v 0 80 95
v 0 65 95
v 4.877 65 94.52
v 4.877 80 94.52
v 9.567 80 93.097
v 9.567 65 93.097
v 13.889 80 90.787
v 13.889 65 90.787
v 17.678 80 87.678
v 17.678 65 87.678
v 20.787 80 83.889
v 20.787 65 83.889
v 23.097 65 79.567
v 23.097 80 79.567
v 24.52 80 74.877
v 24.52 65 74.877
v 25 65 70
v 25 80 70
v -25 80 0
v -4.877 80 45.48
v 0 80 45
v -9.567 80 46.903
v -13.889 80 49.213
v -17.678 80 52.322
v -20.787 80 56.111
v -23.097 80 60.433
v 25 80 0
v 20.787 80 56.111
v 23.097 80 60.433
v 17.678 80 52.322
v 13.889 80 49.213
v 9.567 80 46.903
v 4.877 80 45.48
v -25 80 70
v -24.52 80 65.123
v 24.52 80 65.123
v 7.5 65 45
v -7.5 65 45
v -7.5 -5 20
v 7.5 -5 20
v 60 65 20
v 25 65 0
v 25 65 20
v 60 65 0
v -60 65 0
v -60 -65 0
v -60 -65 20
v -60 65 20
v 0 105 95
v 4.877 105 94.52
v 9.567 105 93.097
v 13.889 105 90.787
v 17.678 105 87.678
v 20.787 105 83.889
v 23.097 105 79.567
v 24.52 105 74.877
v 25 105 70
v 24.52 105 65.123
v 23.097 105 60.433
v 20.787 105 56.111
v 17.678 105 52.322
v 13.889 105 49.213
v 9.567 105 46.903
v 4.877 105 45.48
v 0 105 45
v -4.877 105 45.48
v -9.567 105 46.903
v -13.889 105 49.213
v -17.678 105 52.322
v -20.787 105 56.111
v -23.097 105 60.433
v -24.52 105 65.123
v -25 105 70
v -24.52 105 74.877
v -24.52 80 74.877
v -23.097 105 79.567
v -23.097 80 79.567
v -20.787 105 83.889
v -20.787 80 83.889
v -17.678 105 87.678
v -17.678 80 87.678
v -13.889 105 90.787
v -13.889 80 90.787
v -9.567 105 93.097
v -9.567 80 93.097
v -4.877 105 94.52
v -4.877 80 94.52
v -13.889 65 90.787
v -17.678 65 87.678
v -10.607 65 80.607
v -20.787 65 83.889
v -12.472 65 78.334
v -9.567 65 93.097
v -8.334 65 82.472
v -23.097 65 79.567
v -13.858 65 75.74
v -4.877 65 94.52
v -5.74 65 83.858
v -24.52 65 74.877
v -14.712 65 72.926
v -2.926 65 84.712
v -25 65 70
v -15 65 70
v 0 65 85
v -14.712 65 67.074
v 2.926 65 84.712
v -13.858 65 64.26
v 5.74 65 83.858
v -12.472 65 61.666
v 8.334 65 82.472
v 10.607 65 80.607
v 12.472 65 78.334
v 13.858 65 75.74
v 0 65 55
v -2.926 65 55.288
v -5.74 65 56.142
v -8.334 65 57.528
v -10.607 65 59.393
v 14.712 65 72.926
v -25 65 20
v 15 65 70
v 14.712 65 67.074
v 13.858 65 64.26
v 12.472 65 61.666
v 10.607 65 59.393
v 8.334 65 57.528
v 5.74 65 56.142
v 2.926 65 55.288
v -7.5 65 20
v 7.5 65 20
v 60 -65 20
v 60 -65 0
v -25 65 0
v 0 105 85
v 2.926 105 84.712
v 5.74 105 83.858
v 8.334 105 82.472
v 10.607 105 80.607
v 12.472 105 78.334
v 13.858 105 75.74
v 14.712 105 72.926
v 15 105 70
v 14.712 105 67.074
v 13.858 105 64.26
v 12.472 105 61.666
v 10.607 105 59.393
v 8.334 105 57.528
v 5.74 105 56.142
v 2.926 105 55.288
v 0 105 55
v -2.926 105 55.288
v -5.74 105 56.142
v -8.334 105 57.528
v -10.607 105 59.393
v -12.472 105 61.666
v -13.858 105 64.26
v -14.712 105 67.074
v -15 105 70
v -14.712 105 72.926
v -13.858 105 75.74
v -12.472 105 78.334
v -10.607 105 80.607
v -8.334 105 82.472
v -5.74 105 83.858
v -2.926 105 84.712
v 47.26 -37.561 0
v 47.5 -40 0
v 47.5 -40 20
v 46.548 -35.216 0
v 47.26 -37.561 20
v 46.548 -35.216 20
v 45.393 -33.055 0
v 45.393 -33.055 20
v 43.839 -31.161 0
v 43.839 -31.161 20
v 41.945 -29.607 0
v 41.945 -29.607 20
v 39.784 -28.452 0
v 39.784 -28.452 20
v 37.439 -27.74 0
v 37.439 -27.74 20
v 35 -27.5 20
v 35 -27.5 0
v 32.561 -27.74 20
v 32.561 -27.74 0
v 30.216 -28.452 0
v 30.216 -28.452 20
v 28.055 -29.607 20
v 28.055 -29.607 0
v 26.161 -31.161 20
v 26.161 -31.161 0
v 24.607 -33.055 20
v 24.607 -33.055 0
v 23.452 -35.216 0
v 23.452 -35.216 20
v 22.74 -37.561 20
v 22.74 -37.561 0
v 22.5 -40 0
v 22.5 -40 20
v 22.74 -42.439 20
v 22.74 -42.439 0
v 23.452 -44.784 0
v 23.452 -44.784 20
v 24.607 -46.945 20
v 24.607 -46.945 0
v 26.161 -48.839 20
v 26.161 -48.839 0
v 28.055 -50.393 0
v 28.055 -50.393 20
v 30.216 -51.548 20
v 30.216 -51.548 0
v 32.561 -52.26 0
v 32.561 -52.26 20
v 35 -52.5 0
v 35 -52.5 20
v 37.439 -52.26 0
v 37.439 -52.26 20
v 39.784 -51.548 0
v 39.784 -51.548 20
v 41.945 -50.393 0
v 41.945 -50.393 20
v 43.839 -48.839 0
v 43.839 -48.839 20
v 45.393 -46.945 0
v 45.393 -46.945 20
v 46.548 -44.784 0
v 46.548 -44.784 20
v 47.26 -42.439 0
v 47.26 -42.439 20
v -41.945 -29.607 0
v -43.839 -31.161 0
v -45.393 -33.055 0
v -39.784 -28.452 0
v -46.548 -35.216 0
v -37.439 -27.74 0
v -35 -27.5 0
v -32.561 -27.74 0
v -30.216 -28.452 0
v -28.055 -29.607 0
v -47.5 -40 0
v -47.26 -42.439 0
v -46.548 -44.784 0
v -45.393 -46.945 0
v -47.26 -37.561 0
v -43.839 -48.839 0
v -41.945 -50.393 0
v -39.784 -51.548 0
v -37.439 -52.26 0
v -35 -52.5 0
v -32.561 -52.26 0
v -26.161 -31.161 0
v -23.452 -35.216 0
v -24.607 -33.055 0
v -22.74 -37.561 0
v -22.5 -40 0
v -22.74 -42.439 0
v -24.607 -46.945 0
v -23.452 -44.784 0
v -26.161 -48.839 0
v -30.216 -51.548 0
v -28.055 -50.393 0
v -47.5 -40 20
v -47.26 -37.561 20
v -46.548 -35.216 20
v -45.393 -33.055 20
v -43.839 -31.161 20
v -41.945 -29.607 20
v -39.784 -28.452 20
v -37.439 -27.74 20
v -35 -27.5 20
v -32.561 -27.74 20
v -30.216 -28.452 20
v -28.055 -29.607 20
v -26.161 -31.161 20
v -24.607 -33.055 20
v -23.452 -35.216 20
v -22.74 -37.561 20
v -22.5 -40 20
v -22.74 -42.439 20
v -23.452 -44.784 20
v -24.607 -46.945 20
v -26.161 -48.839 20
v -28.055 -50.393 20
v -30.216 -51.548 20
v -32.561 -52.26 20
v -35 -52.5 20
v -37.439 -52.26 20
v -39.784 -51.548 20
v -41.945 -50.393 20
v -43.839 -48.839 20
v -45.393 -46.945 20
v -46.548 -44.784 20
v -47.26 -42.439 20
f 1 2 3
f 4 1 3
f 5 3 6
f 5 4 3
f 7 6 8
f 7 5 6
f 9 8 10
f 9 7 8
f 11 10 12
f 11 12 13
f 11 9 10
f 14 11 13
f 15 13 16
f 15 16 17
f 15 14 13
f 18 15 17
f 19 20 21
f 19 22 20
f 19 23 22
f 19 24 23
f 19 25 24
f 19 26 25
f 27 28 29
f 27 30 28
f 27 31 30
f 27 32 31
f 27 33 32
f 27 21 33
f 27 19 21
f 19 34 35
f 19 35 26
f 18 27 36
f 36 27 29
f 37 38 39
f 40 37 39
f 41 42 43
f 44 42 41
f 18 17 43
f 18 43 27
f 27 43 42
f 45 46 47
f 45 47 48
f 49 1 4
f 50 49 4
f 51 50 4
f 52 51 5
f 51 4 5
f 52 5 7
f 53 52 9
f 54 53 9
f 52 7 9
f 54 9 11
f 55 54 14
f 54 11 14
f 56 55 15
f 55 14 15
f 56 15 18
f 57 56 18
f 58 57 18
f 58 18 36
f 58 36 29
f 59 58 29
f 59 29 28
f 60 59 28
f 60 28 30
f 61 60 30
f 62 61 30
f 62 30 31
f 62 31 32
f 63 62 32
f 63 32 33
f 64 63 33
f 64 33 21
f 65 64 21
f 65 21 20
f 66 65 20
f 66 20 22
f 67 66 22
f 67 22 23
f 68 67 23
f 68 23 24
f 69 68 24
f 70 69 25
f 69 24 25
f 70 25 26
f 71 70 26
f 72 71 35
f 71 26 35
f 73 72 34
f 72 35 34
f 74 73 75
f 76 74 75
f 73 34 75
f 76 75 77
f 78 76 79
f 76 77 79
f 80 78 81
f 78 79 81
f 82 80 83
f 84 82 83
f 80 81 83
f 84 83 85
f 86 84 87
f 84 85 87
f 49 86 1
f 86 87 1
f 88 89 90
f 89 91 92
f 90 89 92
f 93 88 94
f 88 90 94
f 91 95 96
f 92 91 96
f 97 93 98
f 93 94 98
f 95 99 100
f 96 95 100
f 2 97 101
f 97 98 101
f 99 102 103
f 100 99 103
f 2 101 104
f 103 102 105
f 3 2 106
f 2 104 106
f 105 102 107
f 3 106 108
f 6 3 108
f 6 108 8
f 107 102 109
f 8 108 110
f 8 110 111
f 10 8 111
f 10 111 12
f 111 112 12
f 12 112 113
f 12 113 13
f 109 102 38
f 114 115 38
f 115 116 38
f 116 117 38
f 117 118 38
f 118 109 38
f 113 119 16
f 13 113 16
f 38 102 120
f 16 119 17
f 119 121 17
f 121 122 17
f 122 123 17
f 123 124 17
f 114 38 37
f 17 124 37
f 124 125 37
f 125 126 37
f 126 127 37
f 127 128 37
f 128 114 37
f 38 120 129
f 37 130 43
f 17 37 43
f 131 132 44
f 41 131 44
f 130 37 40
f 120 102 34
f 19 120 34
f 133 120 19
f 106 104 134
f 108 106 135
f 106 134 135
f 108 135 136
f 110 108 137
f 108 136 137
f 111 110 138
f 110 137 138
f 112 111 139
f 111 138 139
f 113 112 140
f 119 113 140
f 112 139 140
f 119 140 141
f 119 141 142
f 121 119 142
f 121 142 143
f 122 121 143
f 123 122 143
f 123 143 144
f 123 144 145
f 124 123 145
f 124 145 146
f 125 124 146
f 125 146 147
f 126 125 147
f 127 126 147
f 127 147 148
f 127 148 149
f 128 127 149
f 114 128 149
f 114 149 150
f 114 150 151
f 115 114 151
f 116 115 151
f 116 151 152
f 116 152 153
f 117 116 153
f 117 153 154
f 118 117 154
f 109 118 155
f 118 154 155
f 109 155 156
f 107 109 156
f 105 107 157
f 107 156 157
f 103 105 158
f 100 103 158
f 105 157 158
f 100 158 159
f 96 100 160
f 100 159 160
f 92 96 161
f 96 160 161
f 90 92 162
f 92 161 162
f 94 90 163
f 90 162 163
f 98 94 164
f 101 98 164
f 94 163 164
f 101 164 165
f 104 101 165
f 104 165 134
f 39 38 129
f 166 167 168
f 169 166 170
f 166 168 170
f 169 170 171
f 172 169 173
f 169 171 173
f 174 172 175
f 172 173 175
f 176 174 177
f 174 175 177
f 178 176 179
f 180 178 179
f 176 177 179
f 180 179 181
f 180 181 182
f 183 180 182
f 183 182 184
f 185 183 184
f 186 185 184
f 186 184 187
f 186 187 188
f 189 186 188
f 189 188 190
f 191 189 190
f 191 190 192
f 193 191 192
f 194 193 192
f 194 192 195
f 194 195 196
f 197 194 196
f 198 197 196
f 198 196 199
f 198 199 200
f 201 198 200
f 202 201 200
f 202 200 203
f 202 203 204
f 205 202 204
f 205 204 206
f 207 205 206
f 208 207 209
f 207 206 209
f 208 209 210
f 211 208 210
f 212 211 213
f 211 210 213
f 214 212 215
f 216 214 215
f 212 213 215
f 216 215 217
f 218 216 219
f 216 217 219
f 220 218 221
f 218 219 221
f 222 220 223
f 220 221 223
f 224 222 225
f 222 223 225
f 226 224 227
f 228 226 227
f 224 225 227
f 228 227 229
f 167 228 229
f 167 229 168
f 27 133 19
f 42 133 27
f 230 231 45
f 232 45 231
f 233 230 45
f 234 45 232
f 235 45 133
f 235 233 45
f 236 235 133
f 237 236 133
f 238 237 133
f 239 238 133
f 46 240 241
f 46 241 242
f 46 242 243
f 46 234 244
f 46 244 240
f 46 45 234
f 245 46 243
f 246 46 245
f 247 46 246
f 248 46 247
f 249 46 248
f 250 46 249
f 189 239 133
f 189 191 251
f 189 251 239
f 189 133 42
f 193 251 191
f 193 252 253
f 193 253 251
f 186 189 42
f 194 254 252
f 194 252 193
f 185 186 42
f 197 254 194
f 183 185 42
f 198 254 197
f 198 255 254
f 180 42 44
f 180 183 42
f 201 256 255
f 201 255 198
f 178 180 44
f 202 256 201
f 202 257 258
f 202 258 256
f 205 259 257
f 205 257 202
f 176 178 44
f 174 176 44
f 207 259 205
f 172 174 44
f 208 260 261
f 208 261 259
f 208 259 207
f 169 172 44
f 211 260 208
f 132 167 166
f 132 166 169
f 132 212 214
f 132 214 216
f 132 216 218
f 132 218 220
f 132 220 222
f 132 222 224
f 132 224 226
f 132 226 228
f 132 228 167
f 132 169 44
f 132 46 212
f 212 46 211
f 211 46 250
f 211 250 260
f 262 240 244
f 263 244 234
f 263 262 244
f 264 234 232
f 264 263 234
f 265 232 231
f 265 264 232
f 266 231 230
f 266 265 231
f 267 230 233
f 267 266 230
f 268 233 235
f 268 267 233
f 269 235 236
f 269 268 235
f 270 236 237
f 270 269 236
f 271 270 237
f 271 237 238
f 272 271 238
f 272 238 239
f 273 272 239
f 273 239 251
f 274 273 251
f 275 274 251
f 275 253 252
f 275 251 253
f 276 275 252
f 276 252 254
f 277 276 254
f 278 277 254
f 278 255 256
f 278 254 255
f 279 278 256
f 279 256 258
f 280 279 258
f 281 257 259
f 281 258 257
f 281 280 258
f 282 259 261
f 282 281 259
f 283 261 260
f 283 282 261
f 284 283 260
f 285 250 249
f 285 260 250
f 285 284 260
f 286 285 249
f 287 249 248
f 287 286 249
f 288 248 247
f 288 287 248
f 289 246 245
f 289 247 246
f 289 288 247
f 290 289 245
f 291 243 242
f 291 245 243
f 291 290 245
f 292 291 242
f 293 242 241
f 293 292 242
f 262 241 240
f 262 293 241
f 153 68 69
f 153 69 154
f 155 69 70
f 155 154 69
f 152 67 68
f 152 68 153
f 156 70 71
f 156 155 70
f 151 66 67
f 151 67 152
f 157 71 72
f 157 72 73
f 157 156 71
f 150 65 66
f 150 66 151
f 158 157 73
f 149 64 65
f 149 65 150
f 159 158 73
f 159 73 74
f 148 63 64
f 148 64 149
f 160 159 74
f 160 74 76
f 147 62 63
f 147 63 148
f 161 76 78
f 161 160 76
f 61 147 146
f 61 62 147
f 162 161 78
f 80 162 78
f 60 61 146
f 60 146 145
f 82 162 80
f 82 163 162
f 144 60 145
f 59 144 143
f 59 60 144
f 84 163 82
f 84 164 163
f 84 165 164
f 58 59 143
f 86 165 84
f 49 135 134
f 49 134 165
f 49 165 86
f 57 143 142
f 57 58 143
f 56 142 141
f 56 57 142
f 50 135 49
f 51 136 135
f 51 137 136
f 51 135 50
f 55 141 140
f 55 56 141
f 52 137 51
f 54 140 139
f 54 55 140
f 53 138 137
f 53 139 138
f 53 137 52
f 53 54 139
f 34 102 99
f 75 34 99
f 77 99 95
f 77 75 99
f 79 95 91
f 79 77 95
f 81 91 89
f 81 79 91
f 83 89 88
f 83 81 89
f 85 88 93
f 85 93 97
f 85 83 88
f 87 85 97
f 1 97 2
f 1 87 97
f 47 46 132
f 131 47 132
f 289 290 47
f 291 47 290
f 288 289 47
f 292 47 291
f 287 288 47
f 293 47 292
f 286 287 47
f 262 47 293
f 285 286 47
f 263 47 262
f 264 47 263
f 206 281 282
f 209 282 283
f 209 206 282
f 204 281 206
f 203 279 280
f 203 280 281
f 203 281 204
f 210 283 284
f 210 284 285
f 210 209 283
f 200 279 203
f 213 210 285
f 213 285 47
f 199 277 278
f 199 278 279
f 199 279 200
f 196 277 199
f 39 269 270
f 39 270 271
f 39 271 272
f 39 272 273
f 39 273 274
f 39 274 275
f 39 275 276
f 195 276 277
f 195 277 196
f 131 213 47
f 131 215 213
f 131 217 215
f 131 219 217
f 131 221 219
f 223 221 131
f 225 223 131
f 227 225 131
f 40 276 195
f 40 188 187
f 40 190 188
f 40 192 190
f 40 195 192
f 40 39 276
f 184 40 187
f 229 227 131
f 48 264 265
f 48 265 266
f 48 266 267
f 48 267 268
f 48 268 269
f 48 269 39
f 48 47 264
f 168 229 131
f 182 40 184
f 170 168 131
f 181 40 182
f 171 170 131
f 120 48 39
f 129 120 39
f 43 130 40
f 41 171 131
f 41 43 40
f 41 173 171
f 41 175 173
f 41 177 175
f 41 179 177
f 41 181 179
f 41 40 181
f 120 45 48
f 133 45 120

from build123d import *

# Parameters (mm, degrees)
SKETCH_1_W                  = 120
SKETCH_1_H                  = 130
EXTRUDE_1_DEPTH             = 20
SKETCH_2_R                  = 12.5
CUT_EXTRUDE_1_DEPTH         = 91.691785736
SKETCH_3_W                  = 50
SKETCH_3_H                  = 70
EXTRUDE_2_DEPTH             = 15
SKETCH_4_R                  = 25
EXTRUDE_3_DEPTH             = 25
EXTRUDE_3_DIRECTION_2_REACH = 173.828
SKETCH_5_R                  = 15
CUT_EXTRUDE_2_DEPTH         = 204.776838723
RIB_1_REACH                 = 155.786
SKETCH_6_WALL_W             = 383.901473722
SKETCH_6_WALL_H             = 15


with BuildPart() as part:
    # Эскиз1 → Бобышка-Вытянуть1 (new body)
    with BuildSketch(Plane.XY):
        Rectangle(SKETCH_1_W, SKETCH_1_H)
    extrude(amount=EXTRUDE_1_DEPTH)

    # Эскиз2 → Вырез-Вытянуть1 (cut, through all)
    with BuildSketch(Plane.XY.offset(20)):
        with Locations((35, -40)):
            Circle(SKETCH_2_R)
    cut_extrude_1 = extrude(amount=-CUT_EXTRUDE_1_DEPTH, mode=Mode.SUBTRACT)

    # Зеркальное отражение1: Вырез-Вытянуть1 across plane
    add(cut_extrude_1.mirror(Plane(origin=(0, 0, 0), x_dir=(0, 0, 1), z_dir=(1, 0, 0))), mode=Mode.SUBTRACT)

    # Эскиз3 → Бобышка-Вытянуть2 (add)
    with BuildSketch(Plane(origin=(0, 65, 0), x_dir=(1, 0, 0), z_dir=(0, 1, 0))):
        with Locations((0, -35)):
            Rectangle(SKETCH_3_W, SKETCH_3_H)
    extrude(amount=EXTRUDE_2_DEPTH)

    # Эскиз4 → Бобышка-Вытянуть3 (add)
    with BuildSketch(Plane(origin=(0, 80, 0), x_dir=(1, 0, 0), z_dir=(0, 1, 0))):
        with Locations(Location((0, -70, 0), (0, 0, 270))):
            Circle(SKETCH_4_R)
    extrude(amount=EXTRUDE_3_DEPTH)

    # Бобышка-Вытянуть3 direction 2: up to this face of the body (flat: up to its plane)
    extrude_3_direction_2_end = Plane(part.part.faces().sort_by_distance((0, 65, 45))[0])
    # Эскиз4 → Бобышка-Вытянуть3 direction 2 (add, up to the picked face)
    with BuildSketch(Plane(origin=(0, 80, 0), x_dir=(1, 0, 0), z_dir=(0, 1, 0)), mode=Mode.PRIVATE) as extrude_3_direction_2_sk1:
        with Locations(Location((0, -70, 0), (0, 0, 270))):
            Circle(SKETCH_4_R)
    extrude_3_direction_2_tool1 = split(extrude(extrude_3_direction_2_sk1.sketch, amount=-EXTRUDE_3_DIRECTION_2_REACH, mode=Mode.PRIVATE), bisect_by=extrude_3_direction_2_end, keep=Keep.BOTH, mode=Mode.PRIVATE)
    add(extrude_3_direction_2_tool1.solids().sort_by(Axis((0, 80, 70), (0, -1, 0)))[0])

    # Эскиз5 → Вырез-Вытянуть2 (cut, through all)
    with BuildSketch(Plane(origin=(0, 105, 0), x_dir=(1, 0, 0), z_dir=(0, 1, 0))):
        with Locations(Location((0, -70, 0), (0, 0, 270))):
            Circle(SKETCH_5_R)
    extrude(amount=-CUT_EXTRUDE_2_DEPTH, mode=Mode.SUBTRACT)

    # Эскиз6 wall → Ребро1 (add, up to next)
    with BuildSketch(Plane(origin=(0, 30, 32.5), x_dir=(0, -0.941741911595, -0.336336396998), z_dir=(0, 0.336336396998, -0.941741911595)), mode=Mode.PRIVATE) as rib_1_sk1:
        Rectangle(SKETCH_6_WALL_W, SKETCH_6_WALL_H)
    rib_1_tool1 = extrude(rib_1_sk1.sketch, amount=RIB_1_REACH, mode=Mode.PRIVATE) - part.part
    add(rib_1_tool1.solids().sort_by_distance((0, 30, 32.5))[0])


solid = part.part
